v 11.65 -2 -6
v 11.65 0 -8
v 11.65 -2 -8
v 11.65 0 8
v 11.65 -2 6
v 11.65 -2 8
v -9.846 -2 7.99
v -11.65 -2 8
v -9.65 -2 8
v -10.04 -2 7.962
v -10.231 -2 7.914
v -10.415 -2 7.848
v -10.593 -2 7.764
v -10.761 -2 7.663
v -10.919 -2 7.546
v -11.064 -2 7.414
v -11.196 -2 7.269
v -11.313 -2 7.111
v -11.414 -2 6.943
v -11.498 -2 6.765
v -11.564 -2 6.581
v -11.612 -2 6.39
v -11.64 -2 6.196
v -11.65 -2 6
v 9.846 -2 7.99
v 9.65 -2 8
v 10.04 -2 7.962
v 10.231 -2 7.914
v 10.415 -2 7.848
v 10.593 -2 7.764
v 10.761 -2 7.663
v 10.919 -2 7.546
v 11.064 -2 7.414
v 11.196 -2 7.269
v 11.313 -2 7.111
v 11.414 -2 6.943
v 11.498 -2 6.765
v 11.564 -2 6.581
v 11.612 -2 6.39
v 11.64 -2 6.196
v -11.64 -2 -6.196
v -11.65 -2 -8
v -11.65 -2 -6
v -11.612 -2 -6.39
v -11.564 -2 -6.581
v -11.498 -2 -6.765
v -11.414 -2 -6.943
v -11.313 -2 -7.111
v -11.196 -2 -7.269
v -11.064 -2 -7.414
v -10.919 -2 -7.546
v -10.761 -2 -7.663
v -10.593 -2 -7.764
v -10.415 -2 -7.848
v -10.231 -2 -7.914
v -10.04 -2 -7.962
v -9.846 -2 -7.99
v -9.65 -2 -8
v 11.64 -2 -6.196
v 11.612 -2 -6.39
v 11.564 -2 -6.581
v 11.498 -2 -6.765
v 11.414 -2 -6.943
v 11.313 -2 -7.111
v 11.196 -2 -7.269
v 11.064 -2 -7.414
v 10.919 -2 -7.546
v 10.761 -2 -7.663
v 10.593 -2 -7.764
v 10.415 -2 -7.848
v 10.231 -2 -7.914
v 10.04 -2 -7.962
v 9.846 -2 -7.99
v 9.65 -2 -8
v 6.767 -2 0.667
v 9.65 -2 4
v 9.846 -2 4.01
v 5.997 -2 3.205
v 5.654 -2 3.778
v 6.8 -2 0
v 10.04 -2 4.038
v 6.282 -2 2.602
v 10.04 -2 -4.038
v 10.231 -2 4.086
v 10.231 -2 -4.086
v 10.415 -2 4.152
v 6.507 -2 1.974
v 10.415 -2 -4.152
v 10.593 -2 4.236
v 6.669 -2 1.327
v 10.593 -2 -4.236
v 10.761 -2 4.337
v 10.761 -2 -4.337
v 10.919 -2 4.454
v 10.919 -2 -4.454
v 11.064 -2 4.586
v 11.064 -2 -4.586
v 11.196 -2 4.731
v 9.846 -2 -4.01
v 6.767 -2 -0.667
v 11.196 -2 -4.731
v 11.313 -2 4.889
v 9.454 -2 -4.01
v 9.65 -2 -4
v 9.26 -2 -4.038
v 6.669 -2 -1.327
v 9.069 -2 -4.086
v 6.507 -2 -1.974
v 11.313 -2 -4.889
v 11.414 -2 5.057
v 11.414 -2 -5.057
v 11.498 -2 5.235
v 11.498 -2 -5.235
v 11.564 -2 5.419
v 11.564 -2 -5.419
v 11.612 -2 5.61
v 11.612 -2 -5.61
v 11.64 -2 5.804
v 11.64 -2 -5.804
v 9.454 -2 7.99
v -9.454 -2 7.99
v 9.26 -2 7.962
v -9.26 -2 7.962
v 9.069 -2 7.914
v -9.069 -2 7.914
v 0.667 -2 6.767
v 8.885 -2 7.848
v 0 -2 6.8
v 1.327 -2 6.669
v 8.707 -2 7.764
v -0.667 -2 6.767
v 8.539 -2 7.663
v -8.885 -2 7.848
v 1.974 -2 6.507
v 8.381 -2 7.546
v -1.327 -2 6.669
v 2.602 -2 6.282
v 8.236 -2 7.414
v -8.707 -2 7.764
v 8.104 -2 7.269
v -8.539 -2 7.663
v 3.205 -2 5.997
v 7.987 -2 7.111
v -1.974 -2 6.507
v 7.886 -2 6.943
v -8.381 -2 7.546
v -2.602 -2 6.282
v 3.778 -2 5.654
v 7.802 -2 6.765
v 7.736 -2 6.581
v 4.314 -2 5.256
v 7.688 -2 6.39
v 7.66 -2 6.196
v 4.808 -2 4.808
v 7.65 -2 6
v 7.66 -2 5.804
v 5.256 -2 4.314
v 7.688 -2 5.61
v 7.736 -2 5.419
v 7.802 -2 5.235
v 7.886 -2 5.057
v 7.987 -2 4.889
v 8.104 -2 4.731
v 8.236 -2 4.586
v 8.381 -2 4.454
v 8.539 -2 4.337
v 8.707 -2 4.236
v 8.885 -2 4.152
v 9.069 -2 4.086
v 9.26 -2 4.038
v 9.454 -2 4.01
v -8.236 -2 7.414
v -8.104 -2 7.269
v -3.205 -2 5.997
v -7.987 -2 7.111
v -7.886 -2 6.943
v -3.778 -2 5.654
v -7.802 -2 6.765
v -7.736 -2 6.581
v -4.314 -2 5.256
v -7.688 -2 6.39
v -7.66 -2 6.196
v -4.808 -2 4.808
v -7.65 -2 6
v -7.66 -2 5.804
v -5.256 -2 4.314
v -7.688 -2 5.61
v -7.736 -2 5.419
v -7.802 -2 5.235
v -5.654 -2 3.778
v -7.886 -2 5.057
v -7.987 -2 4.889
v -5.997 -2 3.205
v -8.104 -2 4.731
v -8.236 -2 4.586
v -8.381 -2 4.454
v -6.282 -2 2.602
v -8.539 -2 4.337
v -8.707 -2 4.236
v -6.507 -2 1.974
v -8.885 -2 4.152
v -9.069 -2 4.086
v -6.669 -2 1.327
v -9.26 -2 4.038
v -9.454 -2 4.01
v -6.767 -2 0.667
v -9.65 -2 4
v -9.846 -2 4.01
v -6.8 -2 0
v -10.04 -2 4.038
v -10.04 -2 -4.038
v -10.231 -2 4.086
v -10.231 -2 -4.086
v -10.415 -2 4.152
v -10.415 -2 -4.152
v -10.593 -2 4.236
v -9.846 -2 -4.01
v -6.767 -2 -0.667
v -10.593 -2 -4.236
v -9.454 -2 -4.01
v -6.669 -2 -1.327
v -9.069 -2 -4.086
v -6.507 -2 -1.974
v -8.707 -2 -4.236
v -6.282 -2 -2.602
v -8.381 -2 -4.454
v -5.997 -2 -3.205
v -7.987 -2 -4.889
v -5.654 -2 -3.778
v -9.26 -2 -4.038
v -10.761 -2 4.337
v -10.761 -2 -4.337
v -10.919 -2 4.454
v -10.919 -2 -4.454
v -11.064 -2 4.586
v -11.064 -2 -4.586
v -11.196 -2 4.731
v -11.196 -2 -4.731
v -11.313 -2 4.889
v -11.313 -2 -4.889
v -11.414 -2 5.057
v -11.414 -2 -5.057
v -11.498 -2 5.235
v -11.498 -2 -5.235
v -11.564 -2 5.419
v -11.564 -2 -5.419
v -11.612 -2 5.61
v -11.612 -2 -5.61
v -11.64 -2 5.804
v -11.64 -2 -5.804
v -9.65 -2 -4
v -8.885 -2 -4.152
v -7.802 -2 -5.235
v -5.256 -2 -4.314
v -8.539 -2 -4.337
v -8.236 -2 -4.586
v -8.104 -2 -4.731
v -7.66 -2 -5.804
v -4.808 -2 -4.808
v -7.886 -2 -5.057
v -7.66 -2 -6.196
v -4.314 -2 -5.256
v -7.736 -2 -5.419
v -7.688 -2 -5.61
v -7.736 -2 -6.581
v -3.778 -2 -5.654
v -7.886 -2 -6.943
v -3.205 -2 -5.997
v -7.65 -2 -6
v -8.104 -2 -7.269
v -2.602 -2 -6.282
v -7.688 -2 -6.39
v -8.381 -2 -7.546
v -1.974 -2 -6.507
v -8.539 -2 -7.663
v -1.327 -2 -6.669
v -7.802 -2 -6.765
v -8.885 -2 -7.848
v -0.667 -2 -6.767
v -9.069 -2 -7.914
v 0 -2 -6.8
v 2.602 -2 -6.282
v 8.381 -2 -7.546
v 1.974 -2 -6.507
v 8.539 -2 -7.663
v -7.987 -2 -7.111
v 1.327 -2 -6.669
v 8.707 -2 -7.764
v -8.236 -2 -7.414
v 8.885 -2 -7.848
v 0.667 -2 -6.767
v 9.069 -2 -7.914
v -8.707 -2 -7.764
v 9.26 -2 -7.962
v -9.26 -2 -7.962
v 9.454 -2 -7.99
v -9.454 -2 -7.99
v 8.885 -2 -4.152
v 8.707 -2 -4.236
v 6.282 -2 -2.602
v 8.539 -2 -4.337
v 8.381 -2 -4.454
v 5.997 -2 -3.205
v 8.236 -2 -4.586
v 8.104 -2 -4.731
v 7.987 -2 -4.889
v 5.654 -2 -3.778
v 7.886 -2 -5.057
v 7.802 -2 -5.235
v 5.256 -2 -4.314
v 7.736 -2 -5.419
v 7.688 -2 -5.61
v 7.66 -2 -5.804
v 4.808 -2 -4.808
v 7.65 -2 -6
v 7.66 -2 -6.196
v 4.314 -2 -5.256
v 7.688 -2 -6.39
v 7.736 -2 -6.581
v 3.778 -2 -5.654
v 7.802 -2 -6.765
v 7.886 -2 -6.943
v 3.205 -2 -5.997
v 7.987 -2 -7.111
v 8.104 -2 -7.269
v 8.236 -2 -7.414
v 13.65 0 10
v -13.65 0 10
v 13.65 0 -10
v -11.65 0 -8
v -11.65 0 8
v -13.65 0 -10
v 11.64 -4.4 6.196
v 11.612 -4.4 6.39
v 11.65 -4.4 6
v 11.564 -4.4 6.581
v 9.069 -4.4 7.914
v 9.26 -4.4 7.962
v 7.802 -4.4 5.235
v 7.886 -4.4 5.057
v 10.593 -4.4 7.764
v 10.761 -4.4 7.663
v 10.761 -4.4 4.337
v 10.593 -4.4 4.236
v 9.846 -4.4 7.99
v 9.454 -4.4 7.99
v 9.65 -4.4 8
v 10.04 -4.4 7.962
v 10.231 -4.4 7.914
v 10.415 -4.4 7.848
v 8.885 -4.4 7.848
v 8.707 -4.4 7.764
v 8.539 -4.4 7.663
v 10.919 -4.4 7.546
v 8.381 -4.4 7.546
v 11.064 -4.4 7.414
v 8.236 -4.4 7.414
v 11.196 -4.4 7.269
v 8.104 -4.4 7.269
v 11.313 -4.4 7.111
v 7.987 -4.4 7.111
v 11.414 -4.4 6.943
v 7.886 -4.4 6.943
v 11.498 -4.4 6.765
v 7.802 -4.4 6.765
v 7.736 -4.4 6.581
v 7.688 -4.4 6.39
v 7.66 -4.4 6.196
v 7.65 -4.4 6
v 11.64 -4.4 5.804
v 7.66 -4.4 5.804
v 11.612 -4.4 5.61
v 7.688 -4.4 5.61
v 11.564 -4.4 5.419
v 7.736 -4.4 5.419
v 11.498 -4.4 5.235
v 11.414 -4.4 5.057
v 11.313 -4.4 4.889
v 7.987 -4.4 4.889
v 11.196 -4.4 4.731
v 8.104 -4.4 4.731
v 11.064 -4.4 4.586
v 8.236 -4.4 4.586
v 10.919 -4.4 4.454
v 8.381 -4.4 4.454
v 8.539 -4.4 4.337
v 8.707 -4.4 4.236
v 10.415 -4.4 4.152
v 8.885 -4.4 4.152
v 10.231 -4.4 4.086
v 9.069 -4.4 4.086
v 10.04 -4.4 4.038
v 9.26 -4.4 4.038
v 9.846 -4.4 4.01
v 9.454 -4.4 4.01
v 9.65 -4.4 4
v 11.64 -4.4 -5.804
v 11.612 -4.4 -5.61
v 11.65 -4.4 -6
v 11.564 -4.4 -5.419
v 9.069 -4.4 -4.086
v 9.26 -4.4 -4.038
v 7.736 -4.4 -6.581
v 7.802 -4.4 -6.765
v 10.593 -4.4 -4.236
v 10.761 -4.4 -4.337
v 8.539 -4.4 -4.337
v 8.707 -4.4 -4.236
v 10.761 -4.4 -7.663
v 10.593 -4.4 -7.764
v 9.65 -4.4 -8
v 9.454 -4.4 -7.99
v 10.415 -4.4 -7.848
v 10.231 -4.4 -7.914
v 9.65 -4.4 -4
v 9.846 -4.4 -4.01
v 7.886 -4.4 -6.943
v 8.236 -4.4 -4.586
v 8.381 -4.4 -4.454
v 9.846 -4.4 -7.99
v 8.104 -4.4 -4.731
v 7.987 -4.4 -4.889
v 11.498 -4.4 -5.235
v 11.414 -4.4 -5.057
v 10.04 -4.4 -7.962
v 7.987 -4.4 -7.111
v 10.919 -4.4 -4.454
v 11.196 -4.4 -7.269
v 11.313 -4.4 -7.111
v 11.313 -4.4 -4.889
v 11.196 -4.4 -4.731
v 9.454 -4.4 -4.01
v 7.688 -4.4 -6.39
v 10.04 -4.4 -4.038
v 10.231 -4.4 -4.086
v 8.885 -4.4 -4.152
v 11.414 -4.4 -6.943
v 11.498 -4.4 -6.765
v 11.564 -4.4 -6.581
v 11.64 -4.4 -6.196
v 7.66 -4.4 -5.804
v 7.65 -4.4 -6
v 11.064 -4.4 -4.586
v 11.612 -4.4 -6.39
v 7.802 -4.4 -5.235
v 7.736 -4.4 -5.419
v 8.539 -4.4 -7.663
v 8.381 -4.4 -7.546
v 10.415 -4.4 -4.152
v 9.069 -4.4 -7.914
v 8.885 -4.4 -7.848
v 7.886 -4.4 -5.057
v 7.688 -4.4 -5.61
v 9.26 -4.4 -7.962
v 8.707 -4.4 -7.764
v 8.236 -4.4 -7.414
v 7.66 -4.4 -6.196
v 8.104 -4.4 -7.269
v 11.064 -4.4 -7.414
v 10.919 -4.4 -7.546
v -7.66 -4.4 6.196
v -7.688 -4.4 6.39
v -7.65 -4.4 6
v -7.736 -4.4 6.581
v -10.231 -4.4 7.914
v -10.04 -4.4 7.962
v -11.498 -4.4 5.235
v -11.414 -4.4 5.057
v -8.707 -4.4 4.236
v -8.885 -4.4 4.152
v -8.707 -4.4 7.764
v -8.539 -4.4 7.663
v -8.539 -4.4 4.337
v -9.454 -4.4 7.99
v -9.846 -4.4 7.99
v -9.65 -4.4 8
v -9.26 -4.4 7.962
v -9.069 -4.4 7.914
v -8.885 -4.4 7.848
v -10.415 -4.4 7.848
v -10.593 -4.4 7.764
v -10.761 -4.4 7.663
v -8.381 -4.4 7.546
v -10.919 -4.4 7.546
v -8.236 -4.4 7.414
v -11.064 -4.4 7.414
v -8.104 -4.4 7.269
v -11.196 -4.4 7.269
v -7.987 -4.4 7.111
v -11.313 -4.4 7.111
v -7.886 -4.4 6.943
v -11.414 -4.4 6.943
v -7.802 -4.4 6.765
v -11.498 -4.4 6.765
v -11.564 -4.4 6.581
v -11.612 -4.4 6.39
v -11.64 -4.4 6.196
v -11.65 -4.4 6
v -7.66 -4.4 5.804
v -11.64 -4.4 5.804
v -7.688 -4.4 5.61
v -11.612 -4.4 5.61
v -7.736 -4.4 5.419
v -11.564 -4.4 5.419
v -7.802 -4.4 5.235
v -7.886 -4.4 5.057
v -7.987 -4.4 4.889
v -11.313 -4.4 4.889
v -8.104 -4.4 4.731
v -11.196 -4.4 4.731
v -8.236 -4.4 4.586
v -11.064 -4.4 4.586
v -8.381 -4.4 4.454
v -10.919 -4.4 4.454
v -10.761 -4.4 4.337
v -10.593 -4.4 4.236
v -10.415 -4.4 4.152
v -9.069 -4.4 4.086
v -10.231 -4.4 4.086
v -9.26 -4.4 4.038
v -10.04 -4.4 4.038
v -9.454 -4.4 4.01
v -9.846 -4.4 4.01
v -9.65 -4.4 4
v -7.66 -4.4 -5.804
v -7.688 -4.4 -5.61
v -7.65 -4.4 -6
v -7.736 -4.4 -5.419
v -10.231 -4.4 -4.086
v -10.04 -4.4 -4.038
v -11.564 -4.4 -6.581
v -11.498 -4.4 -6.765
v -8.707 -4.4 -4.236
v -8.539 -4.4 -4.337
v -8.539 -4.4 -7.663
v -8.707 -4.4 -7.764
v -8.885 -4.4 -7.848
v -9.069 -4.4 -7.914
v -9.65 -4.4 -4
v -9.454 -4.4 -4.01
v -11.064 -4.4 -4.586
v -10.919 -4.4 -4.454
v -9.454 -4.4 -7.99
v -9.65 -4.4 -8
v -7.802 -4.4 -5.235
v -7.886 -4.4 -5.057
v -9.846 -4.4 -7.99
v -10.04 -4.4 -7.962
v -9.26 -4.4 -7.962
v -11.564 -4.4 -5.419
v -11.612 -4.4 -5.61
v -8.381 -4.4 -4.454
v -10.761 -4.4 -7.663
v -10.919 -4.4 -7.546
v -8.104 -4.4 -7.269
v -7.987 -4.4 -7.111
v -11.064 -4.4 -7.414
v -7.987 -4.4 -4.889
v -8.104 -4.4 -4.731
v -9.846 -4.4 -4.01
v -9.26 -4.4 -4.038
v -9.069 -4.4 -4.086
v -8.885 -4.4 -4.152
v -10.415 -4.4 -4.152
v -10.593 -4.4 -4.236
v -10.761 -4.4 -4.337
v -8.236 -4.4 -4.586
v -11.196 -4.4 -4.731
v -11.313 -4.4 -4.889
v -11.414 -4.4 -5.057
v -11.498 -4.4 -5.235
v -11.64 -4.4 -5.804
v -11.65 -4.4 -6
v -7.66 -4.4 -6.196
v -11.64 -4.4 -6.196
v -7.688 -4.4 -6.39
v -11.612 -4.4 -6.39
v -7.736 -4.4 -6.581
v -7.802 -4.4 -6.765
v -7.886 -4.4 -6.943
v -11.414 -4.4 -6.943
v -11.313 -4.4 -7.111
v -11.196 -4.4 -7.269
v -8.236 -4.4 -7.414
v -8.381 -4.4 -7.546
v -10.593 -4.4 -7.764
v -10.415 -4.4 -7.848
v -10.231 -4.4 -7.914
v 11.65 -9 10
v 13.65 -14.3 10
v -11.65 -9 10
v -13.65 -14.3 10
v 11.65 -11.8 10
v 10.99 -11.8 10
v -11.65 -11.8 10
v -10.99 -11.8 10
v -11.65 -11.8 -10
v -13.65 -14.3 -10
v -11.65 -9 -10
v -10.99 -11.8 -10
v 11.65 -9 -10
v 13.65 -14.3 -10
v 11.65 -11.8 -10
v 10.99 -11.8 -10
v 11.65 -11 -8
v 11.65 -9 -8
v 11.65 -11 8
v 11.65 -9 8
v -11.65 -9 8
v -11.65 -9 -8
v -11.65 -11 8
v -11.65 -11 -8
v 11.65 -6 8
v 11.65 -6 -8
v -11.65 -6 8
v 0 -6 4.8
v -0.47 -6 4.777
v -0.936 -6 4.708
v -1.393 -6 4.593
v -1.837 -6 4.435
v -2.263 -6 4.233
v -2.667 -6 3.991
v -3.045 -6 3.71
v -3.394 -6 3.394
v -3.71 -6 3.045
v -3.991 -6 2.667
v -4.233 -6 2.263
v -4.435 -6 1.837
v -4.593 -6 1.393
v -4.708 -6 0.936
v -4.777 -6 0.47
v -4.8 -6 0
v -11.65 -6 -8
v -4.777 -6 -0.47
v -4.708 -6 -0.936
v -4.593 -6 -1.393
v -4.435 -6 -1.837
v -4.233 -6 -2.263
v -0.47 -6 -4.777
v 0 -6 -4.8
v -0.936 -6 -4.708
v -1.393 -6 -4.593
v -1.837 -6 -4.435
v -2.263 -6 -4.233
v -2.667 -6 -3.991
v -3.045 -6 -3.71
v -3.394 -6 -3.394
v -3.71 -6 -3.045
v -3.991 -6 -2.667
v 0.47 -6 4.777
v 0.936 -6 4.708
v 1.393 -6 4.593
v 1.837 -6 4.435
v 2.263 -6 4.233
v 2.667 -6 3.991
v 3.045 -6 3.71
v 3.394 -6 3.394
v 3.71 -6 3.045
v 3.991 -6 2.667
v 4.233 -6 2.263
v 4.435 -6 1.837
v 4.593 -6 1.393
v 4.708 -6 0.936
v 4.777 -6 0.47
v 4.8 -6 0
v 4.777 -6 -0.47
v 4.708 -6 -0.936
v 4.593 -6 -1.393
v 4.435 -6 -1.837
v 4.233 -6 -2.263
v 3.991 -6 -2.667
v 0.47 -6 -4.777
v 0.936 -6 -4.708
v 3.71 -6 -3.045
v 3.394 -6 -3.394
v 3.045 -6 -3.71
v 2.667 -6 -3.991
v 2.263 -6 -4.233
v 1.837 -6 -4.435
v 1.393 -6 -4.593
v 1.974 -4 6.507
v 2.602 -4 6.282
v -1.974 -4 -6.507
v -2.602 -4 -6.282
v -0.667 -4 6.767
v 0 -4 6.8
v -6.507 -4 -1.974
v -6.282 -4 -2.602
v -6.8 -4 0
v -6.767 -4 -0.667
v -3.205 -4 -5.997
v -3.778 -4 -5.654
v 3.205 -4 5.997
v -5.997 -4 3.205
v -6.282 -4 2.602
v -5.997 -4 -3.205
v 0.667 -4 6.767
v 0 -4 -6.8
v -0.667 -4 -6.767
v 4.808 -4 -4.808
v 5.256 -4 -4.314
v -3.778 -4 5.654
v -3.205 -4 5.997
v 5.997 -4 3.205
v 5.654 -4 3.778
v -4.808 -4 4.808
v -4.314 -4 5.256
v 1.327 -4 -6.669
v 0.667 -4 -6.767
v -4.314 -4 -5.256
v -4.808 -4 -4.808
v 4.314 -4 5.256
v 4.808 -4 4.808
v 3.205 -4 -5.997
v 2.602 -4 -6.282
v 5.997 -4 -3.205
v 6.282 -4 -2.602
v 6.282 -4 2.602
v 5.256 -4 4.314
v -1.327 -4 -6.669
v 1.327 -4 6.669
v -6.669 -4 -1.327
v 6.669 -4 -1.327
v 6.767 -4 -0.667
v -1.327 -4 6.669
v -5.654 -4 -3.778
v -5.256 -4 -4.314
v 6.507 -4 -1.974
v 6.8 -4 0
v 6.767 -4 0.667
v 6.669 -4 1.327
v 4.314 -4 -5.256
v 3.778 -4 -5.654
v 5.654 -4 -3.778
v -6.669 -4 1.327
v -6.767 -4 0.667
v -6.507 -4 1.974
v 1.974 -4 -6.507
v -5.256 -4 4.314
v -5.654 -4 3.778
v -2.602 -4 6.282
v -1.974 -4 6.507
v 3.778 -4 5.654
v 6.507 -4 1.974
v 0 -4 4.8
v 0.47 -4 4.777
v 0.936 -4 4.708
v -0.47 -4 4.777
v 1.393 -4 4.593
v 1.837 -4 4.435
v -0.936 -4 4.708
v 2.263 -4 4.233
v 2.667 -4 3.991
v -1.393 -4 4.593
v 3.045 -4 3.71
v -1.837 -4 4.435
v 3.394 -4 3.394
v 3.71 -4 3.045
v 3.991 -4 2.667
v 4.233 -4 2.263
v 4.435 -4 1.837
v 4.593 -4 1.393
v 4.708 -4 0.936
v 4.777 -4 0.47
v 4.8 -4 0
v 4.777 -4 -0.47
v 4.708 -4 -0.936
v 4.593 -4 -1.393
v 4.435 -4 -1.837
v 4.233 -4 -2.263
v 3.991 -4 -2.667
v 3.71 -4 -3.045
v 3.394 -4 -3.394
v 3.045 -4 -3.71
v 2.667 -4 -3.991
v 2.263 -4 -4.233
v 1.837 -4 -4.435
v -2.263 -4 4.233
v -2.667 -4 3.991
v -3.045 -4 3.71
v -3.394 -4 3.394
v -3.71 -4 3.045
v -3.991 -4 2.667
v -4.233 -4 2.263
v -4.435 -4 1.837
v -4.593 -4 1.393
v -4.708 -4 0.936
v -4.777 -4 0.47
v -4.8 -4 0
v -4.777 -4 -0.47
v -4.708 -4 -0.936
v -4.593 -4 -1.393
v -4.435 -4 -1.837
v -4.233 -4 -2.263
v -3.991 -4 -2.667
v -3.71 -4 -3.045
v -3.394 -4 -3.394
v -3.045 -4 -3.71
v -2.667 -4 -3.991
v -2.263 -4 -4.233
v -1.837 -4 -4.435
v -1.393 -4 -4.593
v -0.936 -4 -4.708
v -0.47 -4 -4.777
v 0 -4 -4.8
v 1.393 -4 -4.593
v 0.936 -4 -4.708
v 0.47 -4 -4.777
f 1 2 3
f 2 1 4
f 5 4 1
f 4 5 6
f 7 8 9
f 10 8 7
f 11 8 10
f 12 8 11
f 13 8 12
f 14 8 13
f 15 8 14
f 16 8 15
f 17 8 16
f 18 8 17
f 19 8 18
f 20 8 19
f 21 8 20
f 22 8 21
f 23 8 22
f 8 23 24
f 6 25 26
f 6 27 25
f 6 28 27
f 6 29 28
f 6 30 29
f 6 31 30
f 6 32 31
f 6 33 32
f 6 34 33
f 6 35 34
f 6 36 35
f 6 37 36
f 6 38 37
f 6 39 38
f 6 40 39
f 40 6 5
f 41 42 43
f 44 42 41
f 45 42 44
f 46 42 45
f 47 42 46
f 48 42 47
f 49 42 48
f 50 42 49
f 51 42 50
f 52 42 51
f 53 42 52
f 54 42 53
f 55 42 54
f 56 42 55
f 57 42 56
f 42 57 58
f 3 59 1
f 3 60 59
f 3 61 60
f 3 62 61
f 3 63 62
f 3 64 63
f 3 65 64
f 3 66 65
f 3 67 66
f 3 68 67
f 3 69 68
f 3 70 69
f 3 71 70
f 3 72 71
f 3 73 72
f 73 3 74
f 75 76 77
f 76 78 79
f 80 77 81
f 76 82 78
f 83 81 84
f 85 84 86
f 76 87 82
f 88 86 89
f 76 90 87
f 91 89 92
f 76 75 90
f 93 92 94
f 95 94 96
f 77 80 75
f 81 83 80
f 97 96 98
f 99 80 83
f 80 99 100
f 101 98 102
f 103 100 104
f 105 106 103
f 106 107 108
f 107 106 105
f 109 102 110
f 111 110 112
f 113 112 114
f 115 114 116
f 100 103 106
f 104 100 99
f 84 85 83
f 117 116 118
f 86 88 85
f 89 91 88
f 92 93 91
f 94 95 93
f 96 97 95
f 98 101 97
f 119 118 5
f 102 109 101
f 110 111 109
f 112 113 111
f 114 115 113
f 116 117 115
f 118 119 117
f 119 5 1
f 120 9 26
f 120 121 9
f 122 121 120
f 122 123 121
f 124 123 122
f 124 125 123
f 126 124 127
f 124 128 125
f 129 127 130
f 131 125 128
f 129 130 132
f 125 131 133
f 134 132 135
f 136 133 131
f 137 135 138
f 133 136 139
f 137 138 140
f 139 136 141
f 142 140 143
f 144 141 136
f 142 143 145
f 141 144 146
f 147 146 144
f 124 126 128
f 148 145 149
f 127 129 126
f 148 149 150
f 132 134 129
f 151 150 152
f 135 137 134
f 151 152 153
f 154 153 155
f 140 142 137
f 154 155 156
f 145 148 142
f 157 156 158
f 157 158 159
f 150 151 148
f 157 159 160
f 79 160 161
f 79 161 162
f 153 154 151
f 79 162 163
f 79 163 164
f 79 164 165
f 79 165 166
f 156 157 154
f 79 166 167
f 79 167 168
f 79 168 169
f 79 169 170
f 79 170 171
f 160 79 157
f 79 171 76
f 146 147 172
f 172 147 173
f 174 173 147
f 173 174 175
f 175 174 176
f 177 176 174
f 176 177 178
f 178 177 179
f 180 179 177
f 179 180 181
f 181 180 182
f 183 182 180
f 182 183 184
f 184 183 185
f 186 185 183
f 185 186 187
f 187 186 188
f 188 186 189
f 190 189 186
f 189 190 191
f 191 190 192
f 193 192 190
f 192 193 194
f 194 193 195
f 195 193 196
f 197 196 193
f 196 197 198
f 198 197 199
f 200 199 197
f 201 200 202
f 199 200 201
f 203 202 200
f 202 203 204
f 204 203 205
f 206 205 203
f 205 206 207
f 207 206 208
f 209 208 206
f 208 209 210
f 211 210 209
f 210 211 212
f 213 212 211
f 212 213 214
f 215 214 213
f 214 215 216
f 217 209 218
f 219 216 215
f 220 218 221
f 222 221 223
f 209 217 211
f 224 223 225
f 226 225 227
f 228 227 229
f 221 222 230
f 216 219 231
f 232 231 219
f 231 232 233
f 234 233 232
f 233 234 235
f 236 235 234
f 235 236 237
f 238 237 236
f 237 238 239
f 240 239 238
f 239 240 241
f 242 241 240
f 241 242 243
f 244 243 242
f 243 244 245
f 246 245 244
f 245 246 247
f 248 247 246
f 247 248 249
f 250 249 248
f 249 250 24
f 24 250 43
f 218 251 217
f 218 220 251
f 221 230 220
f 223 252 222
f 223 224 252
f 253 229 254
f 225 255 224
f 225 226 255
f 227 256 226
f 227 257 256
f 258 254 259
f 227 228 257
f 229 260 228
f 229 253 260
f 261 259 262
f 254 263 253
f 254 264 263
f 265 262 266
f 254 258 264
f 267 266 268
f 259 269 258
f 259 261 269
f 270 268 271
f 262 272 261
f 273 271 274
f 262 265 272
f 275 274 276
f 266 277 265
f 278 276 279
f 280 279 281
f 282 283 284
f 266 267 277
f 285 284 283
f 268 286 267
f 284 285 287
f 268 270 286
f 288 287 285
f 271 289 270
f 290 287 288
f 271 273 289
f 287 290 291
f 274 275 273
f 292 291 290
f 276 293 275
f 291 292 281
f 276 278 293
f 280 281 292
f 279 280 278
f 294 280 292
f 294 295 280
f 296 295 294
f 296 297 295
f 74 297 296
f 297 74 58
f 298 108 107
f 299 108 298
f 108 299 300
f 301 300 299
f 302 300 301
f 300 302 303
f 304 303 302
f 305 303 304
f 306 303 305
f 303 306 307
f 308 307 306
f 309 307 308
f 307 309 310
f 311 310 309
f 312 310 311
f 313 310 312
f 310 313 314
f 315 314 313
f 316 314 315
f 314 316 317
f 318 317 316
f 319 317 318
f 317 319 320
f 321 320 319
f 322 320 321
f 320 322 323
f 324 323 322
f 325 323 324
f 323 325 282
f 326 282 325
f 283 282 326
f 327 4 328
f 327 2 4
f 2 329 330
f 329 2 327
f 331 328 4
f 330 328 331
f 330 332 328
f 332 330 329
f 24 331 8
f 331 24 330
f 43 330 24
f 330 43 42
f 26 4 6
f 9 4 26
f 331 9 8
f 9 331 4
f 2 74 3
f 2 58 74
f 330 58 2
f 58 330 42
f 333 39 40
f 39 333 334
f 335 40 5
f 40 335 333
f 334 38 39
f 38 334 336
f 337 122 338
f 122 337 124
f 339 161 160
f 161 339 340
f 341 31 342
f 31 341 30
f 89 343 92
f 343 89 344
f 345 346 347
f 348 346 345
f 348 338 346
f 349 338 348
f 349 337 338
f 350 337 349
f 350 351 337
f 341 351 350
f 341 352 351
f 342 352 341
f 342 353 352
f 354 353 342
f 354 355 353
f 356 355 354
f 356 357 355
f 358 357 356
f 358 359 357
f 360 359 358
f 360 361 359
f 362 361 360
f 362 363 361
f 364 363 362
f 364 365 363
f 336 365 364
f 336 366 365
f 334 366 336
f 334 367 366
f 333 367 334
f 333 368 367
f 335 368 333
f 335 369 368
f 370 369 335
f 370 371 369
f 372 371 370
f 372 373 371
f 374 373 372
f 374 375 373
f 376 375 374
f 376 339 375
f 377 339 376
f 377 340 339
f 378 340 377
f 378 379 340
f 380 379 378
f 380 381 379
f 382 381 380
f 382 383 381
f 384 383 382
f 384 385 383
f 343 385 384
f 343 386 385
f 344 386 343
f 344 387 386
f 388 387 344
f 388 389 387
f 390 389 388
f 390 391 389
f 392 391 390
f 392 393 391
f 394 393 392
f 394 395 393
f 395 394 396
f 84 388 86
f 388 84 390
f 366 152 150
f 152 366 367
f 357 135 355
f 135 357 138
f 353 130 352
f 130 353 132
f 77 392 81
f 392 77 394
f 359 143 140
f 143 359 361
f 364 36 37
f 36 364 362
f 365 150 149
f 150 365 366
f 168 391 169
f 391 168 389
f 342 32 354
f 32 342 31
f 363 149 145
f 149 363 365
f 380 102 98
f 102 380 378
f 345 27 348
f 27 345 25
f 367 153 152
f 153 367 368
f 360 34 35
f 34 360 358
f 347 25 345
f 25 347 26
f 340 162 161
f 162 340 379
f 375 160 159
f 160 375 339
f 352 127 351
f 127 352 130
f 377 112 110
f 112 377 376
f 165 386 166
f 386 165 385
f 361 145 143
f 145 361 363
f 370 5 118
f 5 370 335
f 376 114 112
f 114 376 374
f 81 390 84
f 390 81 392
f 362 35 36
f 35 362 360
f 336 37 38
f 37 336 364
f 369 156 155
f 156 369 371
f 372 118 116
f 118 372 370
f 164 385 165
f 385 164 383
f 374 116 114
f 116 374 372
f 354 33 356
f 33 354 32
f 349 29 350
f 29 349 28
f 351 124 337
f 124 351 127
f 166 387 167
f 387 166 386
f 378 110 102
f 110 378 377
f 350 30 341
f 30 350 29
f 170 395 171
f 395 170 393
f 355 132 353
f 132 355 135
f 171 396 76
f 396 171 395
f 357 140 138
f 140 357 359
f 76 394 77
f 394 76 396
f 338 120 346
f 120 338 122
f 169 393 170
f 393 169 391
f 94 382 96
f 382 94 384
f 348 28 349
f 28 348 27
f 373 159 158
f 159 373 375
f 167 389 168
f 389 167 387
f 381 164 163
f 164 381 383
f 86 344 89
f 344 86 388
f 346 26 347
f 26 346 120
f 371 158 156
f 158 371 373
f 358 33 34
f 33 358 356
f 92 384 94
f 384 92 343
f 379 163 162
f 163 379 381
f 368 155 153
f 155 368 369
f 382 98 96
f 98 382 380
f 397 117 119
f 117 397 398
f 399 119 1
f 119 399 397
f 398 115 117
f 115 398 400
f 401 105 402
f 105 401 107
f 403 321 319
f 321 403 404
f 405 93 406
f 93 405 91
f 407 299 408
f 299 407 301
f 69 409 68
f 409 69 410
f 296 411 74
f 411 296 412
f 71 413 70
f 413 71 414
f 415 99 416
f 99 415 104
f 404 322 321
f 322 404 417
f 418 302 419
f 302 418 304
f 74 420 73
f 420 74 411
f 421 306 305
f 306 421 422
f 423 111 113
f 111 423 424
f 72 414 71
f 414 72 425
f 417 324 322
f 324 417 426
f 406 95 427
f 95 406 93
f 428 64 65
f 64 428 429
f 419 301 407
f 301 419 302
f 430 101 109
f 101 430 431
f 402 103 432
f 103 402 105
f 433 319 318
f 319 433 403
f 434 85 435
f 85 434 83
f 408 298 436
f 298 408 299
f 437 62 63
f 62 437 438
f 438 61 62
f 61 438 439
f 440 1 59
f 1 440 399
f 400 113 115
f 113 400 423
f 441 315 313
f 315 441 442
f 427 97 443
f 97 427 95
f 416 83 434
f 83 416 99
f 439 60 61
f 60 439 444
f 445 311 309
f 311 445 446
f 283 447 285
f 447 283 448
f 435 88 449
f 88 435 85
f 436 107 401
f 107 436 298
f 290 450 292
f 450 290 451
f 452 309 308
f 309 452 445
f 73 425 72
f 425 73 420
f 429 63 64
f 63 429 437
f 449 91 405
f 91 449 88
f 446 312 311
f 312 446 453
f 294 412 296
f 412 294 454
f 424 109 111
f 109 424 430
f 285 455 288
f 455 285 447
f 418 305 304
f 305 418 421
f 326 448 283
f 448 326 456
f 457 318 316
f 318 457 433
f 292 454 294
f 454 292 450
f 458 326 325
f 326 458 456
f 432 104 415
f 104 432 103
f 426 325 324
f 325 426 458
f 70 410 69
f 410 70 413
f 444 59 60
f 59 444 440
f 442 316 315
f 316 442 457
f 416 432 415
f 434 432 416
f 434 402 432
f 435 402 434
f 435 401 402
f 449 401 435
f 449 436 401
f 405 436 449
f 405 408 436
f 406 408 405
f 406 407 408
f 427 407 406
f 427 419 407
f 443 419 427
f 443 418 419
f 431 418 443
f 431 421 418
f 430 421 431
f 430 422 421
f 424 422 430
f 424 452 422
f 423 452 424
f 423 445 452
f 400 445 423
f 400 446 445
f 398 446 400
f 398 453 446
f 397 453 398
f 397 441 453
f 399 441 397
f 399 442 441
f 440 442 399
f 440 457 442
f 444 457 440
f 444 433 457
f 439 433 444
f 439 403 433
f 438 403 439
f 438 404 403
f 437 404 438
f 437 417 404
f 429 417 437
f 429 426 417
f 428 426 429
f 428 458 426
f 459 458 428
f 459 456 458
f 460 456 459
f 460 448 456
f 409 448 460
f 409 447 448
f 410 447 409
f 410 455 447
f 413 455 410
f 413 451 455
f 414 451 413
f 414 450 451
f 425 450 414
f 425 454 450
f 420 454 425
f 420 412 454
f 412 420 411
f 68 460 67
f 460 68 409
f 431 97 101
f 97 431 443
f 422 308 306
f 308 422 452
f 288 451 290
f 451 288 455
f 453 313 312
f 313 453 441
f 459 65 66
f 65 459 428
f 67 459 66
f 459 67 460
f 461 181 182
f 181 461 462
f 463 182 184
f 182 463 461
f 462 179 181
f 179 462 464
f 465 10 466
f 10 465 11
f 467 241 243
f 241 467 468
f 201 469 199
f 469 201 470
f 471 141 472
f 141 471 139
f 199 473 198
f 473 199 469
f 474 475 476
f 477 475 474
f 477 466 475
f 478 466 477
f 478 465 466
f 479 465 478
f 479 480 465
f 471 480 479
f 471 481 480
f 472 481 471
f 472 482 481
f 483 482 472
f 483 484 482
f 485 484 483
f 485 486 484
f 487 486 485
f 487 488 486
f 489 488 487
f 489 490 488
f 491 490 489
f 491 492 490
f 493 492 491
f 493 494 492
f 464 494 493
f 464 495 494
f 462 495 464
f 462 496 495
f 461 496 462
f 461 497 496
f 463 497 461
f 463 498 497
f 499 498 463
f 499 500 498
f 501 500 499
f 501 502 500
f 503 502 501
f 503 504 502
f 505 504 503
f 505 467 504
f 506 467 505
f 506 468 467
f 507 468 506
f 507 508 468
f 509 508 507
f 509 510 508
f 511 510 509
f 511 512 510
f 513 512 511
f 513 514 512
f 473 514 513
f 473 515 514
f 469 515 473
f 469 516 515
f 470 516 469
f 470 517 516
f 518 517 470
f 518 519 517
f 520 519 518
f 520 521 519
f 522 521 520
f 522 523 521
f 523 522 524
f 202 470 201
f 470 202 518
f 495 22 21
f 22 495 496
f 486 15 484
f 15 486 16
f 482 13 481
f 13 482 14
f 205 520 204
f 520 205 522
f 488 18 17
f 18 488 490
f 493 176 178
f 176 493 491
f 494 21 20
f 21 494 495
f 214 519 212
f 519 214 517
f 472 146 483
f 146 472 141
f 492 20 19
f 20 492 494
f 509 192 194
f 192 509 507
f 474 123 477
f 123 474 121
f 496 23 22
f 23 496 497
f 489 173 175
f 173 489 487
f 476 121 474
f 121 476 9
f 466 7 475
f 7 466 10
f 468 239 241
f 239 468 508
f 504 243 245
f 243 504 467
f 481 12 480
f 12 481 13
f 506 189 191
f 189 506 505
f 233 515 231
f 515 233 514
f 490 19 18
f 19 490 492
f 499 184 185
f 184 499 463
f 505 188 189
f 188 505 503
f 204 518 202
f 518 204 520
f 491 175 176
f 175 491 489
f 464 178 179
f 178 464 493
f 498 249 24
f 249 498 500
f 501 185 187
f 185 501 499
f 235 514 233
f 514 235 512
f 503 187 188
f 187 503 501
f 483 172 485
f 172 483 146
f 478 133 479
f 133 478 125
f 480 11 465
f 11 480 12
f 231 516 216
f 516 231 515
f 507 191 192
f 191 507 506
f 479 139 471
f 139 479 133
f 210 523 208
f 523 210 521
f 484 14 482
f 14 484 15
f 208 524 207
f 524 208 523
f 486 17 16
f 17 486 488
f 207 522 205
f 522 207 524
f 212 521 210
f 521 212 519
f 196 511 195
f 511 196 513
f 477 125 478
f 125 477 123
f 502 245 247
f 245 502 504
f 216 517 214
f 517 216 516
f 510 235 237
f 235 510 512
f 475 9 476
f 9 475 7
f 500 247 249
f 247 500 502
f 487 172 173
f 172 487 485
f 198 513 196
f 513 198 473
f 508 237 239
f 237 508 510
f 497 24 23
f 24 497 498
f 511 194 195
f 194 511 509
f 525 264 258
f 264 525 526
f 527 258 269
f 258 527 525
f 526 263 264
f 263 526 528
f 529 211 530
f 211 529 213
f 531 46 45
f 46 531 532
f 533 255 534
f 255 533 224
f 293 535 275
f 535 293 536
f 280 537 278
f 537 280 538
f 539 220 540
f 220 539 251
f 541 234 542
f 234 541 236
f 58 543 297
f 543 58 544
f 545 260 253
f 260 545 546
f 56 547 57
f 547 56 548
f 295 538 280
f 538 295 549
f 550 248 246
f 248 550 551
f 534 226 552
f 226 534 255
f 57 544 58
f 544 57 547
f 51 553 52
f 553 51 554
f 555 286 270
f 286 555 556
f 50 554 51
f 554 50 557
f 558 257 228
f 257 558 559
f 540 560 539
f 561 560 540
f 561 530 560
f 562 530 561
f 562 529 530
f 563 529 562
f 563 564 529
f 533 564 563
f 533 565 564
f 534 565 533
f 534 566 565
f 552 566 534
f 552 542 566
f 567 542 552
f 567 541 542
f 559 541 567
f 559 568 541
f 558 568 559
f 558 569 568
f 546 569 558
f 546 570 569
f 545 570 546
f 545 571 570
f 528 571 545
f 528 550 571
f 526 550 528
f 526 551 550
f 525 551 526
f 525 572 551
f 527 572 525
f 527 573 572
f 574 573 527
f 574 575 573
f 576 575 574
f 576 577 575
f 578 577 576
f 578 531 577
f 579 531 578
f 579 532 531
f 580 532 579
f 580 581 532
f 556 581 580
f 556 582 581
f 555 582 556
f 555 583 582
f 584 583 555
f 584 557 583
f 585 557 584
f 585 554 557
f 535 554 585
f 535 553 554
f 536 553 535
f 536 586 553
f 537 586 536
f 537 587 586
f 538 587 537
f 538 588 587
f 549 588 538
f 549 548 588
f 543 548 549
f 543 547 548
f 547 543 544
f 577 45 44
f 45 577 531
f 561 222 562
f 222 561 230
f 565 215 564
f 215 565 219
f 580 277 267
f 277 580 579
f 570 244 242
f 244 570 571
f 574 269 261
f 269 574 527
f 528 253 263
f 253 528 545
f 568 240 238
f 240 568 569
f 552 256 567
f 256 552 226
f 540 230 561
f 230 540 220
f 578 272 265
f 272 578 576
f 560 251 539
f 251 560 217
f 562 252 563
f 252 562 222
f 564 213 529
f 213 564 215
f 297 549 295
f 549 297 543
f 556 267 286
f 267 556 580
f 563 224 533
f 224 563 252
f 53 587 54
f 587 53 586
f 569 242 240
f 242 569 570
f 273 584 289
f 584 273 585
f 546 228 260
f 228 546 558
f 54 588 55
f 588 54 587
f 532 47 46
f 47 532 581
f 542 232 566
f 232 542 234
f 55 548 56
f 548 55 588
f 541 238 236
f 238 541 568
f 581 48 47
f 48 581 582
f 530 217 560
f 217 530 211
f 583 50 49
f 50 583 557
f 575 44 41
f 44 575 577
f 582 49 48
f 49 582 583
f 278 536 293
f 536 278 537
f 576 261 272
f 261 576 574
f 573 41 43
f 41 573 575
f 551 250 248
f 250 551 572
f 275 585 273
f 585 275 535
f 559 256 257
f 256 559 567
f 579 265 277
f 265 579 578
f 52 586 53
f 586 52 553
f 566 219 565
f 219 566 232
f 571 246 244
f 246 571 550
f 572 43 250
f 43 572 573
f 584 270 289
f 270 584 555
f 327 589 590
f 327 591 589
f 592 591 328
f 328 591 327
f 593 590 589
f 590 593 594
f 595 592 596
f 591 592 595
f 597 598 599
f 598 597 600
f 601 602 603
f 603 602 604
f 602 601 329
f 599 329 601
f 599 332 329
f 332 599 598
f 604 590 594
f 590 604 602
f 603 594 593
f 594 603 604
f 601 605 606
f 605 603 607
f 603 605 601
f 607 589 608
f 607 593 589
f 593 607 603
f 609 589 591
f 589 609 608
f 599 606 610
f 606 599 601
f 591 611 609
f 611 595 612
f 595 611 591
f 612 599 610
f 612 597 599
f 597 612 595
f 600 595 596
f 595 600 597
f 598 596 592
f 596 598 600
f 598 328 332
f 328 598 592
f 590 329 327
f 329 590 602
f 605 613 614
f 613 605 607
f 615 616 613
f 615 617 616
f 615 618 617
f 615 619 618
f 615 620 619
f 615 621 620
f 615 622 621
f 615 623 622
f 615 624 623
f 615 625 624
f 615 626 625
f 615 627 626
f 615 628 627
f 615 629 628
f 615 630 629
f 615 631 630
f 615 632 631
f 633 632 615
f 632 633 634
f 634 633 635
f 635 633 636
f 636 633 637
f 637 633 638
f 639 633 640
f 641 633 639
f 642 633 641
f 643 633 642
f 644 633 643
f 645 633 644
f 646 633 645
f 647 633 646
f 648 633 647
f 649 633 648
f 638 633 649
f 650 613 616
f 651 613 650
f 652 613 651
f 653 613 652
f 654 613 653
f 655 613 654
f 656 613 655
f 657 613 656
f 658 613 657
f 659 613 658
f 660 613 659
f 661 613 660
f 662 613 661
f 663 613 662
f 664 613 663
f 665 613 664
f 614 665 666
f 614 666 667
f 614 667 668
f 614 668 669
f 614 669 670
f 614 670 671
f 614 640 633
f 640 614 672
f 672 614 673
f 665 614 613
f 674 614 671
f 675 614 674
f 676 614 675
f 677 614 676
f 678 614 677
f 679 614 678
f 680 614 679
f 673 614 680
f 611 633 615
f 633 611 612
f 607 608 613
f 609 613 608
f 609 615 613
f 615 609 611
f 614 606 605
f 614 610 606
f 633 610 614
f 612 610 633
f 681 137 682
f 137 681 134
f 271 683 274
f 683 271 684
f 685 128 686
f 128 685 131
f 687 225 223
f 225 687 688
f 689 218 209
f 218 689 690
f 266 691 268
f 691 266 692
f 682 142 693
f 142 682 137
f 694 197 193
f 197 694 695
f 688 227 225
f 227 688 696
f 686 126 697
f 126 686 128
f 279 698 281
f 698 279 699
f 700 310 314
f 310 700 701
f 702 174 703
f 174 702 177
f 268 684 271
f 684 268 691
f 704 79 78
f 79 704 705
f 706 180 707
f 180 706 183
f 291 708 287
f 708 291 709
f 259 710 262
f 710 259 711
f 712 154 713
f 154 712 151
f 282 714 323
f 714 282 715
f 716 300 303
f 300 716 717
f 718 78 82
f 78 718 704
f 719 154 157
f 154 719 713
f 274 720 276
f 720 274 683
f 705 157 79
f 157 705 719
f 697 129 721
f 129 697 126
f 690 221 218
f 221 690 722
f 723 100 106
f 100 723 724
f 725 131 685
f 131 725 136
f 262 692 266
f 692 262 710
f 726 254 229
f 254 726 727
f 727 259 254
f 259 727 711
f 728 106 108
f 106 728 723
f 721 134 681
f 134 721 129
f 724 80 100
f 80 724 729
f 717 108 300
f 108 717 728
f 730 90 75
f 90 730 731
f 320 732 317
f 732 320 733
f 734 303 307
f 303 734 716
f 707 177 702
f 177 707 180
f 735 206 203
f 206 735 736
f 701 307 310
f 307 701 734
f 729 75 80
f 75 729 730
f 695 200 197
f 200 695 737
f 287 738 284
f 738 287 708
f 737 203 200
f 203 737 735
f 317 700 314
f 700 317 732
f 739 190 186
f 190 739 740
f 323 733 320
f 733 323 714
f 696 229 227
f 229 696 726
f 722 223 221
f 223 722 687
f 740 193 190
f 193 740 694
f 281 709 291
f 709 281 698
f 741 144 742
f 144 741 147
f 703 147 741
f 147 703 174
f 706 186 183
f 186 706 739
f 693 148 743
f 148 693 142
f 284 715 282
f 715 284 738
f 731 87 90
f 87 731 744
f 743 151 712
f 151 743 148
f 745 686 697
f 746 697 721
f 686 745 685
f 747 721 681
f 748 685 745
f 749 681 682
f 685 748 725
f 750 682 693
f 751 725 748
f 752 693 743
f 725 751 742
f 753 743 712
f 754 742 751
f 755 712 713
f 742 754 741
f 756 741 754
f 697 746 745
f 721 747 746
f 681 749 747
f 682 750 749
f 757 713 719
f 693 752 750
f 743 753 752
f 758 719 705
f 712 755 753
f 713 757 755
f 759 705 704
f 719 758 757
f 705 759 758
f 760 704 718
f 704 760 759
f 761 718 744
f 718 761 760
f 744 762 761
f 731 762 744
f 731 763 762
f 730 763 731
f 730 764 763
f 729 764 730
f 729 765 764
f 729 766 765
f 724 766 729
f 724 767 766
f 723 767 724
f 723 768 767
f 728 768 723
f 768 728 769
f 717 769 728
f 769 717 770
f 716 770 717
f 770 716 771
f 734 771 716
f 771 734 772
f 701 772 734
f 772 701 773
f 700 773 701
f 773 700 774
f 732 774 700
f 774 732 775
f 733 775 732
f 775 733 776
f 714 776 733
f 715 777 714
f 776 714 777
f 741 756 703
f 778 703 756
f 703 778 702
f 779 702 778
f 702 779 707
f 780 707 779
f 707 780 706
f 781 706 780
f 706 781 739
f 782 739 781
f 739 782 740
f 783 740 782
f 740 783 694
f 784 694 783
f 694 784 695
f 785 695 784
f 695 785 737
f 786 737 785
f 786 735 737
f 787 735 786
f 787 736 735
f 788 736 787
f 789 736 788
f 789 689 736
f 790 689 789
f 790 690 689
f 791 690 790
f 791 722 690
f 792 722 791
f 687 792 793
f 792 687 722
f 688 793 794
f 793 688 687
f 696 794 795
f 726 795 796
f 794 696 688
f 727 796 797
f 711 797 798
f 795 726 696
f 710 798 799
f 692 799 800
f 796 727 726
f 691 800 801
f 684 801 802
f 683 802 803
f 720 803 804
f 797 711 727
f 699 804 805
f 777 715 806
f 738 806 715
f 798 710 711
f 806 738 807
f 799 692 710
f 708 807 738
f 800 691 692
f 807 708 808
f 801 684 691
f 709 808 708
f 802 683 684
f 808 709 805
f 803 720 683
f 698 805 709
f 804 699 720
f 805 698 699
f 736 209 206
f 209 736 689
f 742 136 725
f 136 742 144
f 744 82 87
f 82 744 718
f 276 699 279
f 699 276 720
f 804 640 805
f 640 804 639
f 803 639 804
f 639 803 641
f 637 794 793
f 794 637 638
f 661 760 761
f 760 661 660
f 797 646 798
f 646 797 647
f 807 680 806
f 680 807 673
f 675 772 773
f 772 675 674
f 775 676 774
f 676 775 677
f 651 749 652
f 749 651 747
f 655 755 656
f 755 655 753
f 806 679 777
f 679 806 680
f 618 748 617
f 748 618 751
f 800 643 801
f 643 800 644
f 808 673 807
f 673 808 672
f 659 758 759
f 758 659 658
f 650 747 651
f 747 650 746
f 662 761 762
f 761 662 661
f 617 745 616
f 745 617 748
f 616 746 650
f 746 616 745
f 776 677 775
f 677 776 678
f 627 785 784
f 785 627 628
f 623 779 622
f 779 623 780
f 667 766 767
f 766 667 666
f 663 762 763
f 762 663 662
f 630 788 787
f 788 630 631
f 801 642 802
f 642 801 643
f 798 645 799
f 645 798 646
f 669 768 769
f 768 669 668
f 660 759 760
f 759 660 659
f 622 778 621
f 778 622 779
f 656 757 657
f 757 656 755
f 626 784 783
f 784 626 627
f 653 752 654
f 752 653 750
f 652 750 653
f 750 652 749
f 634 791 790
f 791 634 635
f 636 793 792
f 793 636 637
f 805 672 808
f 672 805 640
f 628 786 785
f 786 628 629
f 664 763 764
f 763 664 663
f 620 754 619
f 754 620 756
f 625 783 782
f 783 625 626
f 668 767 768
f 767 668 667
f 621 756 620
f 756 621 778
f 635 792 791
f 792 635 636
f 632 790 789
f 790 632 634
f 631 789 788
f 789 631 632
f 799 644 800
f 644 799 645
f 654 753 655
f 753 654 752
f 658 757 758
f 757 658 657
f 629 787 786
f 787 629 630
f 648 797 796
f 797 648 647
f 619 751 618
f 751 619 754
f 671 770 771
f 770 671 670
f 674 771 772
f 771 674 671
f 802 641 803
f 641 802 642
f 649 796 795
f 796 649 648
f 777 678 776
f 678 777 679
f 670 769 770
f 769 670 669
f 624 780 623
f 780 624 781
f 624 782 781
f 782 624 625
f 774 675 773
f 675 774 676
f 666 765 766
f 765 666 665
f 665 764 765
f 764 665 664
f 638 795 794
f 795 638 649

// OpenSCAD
// file: ../utils.scad
module pillinder(width, radius, height) {
  hull() {
    translate([width/2 - radius, 0, 0])
    cylinder(h=height, r=radius, $fn=64);
    translate([-width/2 + radius, 0, 0])
    cylinder(h=height, r=radius, $fn=64);
  }
}
// main file
include <../utils.scad>

$fn=64;
width = 20;
channel_width = 14 + 9.3;
latch_height = 2.5;
overhang = 0.66;
wall_thickness = 2.8;
box_thickness = 9;
bottom_thickness = 2;
bottom_hole_d = 9.6;
bottom_hole_width = bottom_hole_d;

lip = 2;
inner_d = bottom_hole_d + 2*lip;
inner_h = 2;

outer_x = channel_width/2 + 2;

nail_angle = 30;
nail_d = 2.1;
sheath_wall = 1;
sheath_y = 1.7;

hatch_dowel_d = 4;
hatch_dowel_y = width/2 - hatch_dowel_d;
hatch_dowel_x = channel_width/2 - hatch_dowel_d + 2;
hatch_dowel_kerf = 0.1;

v_kerf = 0.4;
h_kerf = 0.1;


main();
//hatch();
//nail_sheath();

module nail_sheath() {
difference() {
    union() {
        translate([0,sheath_y,0])
        rotate([nail_angle, 0, 0])
        translate([0,0,-2])
        cylinder(h=box_thickness+2, d=nail_d+2*sheath_wall);
        
        
        cylinder(h=bottom_thickness + v_kerf, d=bottom_hole_d-2*h_kerf, d2=bottom_hole_d-2*h_kerf+2*lip);
        cylinder(h=2*bottom_thickness + inner_h, d=bottom_hole_d-2*h_kerf);
        translate([0,0,bottom_thickness+v_kerf])
        cylinder(h=inner_h-2*v_kerf, d=inner_d-2*h_kerf);
    }
    
    translate([0,sheath_y,0])
    rotate([nail_angle, 0, 0])
    translate([0,0,-2])
    cylinder(h=box_thickness+3, d=nail_d);
    
    translate([0,0,-5])
    cube([10,10,10], center=true);
}
}

module hatch() {
  difference() {
    thick = bottom_thickness - 0.2;
    translate([0,0,thick/2])
    cube([channel_width, width - 4, thick], center=true);
      
    cylinder(d1=bottom_hole_d, d2=bottom_hole_d + 2*lip, h=bottom_thickness + v_kerf);
  }
    
  translate([hatch_dowel_x, hatch_dowel_y, 0])
  cylinder(h=bottom_thickness*2, d=hatch_dowel_d - 2*hatch_dowel_kerf);
  translate([hatch_dowel_x, -hatch_dowel_y, 0])
  cylinder(h=bottom_thickness*2, d=hatch_dowel_d - 2*hatch_dowel_kerf);
  translate([-hatch_dowel_x, hatch_dowel_y, 0])
  cylinder(h=bottom_thickness*2, d=hatch_dowel_d - 2*hatch_dowel_kerf);
  translate([-hatch_dowel_x, -hatch_dowel_y, 0])
  cylinder(h=bottom_thickness*2, d=hatch_dowel_d - 2*hatch_dowel_kerf);
}

module main() {
rotate([90,0,0])
translate([0,0,box_thickness])
difference() {
  rotate([90,0,0])
  translate([0, 0, -width/2])
  linear_extrude(width)
  polygon([
    [-outer_x, -box_thickness],
    [-outer_x, wall_thickness + latch_height],
    [-channel_width/2 + overhang, wall_thickness],
    [-channel_width/2, wall_thickness],
    [-channel_width/2, 0],
    [channel_width/2, 0],
    [channel_width/2, wall_thickness],
    [channel_width/2 - overhang, wall_thickness],
    [outer_x, wall_thickness + latch_height],
    [outer_x, -box_thickness],
  ]);
    
  z_dim = box_thickness - bottom_thickness - inner_h;
  translate([0, 0, -z_dim/2 + bottom_thickness])
  cube([channel_width, width - 4, z_dim], center=true);


  translate([0, 0, -box_thickness + bottom_thickness])
  pillinder(bottom_hole_width + 2*lip, inner_d/2, inner_h);
  
  translate([0, 0, -box_thickness - 1])
  pillinder(bottom_hole_width, bottom_hole_d/2, box_thickness+2);
  
  // Hatch negative space
  translate([0,0, -box_thickness]) {
  translate([0,0, bottom_thickness/2])
  cube([channel_width, width - 4, bottom_thickness], center=true);
      
  translate([hatch_dowel_x, hatch_dowel_y, 0])
  cylinder(h=bottom_thickness*2+0.4, d=hatch_dowel_d);
  translate([hatch_dowel_x, -hatch_dowel_y, 0])
  cylinder(h=bottom_thickness*2+0.4, d=hatch_dowel_d);
  translate([-hatch_dowel_x, hatch_dowel_y, 0])
  cylinder(h=bottom_thickness*2+0.4, d=hatch_dowel_d);
  translate([-hatch_dowel_x, -hatch_dowel_y, 0])
  cylinder(h=bottom_thickness*2+0.4, d=hatch_dowel_d);
  }
}
}
